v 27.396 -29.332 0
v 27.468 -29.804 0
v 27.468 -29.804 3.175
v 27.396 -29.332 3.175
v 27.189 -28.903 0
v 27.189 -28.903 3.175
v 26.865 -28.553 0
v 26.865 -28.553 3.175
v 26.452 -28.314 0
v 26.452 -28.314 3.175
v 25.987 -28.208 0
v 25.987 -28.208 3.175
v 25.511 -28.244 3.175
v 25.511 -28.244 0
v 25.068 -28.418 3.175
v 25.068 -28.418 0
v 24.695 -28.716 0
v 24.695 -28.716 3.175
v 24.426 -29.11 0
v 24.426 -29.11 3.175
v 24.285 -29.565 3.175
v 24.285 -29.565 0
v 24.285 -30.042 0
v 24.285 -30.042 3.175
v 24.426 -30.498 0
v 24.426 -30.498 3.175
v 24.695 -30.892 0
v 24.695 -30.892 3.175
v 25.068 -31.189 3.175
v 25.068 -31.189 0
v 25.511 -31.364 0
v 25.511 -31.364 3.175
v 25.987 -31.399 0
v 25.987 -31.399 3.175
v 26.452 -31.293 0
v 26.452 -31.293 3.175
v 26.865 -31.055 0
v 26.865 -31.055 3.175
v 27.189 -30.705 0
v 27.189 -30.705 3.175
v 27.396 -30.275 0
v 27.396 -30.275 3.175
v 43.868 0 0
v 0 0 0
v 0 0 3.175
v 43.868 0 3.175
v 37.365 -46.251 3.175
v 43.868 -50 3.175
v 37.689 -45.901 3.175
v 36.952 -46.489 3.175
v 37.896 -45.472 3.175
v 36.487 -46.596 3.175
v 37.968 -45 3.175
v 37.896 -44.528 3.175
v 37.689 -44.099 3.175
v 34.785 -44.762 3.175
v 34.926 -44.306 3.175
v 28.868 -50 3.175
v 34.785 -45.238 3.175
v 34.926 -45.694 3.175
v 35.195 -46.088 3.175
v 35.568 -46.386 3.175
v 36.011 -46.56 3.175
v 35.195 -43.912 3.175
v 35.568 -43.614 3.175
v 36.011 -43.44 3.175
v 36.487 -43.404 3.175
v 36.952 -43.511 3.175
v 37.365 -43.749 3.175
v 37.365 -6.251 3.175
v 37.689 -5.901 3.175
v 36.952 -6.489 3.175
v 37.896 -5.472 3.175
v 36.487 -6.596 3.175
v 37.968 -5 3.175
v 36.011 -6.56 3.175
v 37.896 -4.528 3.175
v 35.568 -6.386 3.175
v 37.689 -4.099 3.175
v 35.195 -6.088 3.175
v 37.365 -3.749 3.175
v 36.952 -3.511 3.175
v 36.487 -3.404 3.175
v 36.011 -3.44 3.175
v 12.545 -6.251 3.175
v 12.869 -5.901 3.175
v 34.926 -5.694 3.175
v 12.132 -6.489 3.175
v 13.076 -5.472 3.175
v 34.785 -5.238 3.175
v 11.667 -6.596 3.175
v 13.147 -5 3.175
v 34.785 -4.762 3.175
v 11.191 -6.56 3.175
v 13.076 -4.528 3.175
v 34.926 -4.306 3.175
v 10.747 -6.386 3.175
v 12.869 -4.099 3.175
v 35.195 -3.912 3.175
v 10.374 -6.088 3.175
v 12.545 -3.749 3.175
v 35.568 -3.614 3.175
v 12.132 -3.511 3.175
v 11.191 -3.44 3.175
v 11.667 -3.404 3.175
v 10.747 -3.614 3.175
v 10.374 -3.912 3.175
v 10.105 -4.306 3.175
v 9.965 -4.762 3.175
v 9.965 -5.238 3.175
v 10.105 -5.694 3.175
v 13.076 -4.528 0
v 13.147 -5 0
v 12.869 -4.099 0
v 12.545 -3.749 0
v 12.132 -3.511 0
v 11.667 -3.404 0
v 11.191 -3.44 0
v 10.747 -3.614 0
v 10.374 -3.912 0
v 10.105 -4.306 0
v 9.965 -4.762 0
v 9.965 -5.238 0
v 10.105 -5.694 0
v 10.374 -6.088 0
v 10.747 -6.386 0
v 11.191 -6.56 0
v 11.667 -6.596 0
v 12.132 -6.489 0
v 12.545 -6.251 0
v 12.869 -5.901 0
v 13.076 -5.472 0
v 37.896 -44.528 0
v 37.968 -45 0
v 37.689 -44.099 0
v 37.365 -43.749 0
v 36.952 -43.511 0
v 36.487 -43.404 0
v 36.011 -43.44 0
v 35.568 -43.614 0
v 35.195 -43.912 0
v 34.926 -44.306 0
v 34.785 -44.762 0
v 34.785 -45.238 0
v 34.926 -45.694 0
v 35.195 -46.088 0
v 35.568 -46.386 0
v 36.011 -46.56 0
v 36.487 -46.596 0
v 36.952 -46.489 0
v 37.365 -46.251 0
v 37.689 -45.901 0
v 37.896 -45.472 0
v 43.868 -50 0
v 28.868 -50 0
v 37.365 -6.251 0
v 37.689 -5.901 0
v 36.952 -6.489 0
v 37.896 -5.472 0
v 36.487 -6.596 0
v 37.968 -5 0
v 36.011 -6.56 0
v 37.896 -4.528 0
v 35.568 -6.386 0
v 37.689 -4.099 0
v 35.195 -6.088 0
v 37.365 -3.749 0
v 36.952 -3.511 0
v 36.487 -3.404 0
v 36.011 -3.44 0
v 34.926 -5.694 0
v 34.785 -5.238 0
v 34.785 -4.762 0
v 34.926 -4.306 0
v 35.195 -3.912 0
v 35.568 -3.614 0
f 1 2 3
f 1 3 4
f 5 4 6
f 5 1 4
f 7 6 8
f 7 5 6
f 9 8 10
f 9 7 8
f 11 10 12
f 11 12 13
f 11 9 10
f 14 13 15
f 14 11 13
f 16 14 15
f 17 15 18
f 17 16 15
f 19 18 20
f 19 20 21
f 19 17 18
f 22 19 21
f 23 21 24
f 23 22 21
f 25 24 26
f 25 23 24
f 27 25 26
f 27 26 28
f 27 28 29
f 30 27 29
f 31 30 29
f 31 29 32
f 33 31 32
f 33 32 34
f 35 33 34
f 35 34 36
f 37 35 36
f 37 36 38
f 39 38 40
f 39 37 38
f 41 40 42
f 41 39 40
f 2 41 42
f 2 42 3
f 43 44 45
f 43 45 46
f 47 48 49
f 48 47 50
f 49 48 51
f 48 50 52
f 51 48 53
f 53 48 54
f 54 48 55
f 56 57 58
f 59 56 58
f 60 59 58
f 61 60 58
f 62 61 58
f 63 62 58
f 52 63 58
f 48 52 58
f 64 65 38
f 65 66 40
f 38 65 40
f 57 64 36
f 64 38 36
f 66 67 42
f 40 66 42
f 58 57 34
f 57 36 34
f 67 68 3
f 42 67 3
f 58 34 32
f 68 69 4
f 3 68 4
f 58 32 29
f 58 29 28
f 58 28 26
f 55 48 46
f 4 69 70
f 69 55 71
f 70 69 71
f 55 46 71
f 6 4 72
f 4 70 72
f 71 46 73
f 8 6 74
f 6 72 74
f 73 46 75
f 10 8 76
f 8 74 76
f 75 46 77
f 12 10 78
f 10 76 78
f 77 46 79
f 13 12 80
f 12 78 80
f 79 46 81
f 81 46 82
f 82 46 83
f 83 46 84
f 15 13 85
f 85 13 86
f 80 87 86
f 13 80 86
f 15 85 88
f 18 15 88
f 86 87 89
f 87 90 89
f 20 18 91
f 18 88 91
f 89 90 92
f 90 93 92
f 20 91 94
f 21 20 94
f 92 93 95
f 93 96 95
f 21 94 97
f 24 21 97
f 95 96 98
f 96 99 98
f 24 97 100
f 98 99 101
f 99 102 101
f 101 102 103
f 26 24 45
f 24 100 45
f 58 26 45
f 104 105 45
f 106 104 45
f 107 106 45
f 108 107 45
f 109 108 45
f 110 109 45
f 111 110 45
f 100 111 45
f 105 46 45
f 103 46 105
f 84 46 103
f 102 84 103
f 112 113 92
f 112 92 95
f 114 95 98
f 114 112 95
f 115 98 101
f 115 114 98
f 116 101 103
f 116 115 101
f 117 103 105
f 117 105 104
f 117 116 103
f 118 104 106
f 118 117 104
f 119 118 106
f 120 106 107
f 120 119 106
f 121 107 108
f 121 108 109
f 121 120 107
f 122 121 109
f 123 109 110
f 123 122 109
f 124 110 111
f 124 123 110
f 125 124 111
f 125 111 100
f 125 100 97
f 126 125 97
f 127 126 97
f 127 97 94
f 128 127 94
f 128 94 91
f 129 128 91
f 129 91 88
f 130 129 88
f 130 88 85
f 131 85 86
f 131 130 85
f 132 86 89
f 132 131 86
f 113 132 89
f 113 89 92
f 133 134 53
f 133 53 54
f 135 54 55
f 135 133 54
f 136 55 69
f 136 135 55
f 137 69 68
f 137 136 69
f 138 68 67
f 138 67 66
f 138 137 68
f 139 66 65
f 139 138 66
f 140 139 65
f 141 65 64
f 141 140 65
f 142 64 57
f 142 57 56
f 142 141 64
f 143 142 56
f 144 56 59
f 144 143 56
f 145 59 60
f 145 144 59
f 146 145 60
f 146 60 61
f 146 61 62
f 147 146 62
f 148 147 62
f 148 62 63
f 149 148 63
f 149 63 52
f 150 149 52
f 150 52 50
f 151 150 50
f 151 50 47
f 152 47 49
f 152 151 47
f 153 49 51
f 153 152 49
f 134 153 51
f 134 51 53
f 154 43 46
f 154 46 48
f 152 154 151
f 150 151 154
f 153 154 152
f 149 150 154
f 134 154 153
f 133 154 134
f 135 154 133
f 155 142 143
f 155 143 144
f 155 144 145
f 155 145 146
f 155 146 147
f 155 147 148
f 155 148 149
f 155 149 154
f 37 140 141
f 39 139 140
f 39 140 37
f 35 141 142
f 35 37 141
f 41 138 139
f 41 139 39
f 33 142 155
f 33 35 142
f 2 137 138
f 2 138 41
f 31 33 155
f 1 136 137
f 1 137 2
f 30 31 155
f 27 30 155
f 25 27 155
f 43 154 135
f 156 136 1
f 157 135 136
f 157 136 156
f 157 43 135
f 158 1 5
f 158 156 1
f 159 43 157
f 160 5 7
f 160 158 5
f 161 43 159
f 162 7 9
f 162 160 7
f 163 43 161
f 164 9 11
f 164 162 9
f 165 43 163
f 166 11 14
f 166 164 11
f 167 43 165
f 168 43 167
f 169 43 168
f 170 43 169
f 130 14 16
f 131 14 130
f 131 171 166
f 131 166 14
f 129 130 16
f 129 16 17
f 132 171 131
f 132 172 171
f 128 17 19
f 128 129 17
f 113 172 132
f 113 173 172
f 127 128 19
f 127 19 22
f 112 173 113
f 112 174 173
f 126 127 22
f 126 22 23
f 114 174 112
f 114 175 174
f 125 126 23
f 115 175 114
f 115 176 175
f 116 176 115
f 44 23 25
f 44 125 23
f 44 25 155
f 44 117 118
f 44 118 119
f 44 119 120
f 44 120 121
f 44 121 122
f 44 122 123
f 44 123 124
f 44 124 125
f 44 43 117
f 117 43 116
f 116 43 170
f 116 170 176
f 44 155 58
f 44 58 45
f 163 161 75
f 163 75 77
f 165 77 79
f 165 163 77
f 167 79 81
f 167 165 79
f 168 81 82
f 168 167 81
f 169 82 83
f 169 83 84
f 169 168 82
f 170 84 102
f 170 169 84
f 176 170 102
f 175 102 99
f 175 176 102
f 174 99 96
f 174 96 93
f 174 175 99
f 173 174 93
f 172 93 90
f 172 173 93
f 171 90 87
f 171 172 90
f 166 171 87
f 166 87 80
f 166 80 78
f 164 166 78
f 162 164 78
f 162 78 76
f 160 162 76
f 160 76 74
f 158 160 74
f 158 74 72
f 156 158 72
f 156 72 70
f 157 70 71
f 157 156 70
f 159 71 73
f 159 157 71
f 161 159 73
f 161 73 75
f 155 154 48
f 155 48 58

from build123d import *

# Parameters (mm, degrees)
SKETCH1_R           = 1.6
BOSS_EXTRUDE1_DEPTH = 3.175


with BuildPart() as part:
    # Sketch1 → Boss-Extrude1 (new body)
    with BuildSketch(Plane.XY):
        Polygon((0, 0), (43.867513459, 0), (43.867513459, -50), (28.867513459, -50), align=None)
        with Locations((36.367513459, -5)):
            Circle(SKETCH1_R, mode=Mode.SUBTRACT)
        with Locations((36.367513459, -45)):
            Circle(SKETCH1_R, mode=Mode.SUBTRACT)
        with Locations((11.547005384, -5)):
            Circle(SKETCH1_R, mode=Mode.SUBTRACT)
        with Locations((25.867513459, -29.803847577)):
            Circle(SKETCH1_R, mode=Mode.SUBTRACT)
    extrude(amount=BOSS_EXTRUDE1_DEPTH)


solid = part.part
